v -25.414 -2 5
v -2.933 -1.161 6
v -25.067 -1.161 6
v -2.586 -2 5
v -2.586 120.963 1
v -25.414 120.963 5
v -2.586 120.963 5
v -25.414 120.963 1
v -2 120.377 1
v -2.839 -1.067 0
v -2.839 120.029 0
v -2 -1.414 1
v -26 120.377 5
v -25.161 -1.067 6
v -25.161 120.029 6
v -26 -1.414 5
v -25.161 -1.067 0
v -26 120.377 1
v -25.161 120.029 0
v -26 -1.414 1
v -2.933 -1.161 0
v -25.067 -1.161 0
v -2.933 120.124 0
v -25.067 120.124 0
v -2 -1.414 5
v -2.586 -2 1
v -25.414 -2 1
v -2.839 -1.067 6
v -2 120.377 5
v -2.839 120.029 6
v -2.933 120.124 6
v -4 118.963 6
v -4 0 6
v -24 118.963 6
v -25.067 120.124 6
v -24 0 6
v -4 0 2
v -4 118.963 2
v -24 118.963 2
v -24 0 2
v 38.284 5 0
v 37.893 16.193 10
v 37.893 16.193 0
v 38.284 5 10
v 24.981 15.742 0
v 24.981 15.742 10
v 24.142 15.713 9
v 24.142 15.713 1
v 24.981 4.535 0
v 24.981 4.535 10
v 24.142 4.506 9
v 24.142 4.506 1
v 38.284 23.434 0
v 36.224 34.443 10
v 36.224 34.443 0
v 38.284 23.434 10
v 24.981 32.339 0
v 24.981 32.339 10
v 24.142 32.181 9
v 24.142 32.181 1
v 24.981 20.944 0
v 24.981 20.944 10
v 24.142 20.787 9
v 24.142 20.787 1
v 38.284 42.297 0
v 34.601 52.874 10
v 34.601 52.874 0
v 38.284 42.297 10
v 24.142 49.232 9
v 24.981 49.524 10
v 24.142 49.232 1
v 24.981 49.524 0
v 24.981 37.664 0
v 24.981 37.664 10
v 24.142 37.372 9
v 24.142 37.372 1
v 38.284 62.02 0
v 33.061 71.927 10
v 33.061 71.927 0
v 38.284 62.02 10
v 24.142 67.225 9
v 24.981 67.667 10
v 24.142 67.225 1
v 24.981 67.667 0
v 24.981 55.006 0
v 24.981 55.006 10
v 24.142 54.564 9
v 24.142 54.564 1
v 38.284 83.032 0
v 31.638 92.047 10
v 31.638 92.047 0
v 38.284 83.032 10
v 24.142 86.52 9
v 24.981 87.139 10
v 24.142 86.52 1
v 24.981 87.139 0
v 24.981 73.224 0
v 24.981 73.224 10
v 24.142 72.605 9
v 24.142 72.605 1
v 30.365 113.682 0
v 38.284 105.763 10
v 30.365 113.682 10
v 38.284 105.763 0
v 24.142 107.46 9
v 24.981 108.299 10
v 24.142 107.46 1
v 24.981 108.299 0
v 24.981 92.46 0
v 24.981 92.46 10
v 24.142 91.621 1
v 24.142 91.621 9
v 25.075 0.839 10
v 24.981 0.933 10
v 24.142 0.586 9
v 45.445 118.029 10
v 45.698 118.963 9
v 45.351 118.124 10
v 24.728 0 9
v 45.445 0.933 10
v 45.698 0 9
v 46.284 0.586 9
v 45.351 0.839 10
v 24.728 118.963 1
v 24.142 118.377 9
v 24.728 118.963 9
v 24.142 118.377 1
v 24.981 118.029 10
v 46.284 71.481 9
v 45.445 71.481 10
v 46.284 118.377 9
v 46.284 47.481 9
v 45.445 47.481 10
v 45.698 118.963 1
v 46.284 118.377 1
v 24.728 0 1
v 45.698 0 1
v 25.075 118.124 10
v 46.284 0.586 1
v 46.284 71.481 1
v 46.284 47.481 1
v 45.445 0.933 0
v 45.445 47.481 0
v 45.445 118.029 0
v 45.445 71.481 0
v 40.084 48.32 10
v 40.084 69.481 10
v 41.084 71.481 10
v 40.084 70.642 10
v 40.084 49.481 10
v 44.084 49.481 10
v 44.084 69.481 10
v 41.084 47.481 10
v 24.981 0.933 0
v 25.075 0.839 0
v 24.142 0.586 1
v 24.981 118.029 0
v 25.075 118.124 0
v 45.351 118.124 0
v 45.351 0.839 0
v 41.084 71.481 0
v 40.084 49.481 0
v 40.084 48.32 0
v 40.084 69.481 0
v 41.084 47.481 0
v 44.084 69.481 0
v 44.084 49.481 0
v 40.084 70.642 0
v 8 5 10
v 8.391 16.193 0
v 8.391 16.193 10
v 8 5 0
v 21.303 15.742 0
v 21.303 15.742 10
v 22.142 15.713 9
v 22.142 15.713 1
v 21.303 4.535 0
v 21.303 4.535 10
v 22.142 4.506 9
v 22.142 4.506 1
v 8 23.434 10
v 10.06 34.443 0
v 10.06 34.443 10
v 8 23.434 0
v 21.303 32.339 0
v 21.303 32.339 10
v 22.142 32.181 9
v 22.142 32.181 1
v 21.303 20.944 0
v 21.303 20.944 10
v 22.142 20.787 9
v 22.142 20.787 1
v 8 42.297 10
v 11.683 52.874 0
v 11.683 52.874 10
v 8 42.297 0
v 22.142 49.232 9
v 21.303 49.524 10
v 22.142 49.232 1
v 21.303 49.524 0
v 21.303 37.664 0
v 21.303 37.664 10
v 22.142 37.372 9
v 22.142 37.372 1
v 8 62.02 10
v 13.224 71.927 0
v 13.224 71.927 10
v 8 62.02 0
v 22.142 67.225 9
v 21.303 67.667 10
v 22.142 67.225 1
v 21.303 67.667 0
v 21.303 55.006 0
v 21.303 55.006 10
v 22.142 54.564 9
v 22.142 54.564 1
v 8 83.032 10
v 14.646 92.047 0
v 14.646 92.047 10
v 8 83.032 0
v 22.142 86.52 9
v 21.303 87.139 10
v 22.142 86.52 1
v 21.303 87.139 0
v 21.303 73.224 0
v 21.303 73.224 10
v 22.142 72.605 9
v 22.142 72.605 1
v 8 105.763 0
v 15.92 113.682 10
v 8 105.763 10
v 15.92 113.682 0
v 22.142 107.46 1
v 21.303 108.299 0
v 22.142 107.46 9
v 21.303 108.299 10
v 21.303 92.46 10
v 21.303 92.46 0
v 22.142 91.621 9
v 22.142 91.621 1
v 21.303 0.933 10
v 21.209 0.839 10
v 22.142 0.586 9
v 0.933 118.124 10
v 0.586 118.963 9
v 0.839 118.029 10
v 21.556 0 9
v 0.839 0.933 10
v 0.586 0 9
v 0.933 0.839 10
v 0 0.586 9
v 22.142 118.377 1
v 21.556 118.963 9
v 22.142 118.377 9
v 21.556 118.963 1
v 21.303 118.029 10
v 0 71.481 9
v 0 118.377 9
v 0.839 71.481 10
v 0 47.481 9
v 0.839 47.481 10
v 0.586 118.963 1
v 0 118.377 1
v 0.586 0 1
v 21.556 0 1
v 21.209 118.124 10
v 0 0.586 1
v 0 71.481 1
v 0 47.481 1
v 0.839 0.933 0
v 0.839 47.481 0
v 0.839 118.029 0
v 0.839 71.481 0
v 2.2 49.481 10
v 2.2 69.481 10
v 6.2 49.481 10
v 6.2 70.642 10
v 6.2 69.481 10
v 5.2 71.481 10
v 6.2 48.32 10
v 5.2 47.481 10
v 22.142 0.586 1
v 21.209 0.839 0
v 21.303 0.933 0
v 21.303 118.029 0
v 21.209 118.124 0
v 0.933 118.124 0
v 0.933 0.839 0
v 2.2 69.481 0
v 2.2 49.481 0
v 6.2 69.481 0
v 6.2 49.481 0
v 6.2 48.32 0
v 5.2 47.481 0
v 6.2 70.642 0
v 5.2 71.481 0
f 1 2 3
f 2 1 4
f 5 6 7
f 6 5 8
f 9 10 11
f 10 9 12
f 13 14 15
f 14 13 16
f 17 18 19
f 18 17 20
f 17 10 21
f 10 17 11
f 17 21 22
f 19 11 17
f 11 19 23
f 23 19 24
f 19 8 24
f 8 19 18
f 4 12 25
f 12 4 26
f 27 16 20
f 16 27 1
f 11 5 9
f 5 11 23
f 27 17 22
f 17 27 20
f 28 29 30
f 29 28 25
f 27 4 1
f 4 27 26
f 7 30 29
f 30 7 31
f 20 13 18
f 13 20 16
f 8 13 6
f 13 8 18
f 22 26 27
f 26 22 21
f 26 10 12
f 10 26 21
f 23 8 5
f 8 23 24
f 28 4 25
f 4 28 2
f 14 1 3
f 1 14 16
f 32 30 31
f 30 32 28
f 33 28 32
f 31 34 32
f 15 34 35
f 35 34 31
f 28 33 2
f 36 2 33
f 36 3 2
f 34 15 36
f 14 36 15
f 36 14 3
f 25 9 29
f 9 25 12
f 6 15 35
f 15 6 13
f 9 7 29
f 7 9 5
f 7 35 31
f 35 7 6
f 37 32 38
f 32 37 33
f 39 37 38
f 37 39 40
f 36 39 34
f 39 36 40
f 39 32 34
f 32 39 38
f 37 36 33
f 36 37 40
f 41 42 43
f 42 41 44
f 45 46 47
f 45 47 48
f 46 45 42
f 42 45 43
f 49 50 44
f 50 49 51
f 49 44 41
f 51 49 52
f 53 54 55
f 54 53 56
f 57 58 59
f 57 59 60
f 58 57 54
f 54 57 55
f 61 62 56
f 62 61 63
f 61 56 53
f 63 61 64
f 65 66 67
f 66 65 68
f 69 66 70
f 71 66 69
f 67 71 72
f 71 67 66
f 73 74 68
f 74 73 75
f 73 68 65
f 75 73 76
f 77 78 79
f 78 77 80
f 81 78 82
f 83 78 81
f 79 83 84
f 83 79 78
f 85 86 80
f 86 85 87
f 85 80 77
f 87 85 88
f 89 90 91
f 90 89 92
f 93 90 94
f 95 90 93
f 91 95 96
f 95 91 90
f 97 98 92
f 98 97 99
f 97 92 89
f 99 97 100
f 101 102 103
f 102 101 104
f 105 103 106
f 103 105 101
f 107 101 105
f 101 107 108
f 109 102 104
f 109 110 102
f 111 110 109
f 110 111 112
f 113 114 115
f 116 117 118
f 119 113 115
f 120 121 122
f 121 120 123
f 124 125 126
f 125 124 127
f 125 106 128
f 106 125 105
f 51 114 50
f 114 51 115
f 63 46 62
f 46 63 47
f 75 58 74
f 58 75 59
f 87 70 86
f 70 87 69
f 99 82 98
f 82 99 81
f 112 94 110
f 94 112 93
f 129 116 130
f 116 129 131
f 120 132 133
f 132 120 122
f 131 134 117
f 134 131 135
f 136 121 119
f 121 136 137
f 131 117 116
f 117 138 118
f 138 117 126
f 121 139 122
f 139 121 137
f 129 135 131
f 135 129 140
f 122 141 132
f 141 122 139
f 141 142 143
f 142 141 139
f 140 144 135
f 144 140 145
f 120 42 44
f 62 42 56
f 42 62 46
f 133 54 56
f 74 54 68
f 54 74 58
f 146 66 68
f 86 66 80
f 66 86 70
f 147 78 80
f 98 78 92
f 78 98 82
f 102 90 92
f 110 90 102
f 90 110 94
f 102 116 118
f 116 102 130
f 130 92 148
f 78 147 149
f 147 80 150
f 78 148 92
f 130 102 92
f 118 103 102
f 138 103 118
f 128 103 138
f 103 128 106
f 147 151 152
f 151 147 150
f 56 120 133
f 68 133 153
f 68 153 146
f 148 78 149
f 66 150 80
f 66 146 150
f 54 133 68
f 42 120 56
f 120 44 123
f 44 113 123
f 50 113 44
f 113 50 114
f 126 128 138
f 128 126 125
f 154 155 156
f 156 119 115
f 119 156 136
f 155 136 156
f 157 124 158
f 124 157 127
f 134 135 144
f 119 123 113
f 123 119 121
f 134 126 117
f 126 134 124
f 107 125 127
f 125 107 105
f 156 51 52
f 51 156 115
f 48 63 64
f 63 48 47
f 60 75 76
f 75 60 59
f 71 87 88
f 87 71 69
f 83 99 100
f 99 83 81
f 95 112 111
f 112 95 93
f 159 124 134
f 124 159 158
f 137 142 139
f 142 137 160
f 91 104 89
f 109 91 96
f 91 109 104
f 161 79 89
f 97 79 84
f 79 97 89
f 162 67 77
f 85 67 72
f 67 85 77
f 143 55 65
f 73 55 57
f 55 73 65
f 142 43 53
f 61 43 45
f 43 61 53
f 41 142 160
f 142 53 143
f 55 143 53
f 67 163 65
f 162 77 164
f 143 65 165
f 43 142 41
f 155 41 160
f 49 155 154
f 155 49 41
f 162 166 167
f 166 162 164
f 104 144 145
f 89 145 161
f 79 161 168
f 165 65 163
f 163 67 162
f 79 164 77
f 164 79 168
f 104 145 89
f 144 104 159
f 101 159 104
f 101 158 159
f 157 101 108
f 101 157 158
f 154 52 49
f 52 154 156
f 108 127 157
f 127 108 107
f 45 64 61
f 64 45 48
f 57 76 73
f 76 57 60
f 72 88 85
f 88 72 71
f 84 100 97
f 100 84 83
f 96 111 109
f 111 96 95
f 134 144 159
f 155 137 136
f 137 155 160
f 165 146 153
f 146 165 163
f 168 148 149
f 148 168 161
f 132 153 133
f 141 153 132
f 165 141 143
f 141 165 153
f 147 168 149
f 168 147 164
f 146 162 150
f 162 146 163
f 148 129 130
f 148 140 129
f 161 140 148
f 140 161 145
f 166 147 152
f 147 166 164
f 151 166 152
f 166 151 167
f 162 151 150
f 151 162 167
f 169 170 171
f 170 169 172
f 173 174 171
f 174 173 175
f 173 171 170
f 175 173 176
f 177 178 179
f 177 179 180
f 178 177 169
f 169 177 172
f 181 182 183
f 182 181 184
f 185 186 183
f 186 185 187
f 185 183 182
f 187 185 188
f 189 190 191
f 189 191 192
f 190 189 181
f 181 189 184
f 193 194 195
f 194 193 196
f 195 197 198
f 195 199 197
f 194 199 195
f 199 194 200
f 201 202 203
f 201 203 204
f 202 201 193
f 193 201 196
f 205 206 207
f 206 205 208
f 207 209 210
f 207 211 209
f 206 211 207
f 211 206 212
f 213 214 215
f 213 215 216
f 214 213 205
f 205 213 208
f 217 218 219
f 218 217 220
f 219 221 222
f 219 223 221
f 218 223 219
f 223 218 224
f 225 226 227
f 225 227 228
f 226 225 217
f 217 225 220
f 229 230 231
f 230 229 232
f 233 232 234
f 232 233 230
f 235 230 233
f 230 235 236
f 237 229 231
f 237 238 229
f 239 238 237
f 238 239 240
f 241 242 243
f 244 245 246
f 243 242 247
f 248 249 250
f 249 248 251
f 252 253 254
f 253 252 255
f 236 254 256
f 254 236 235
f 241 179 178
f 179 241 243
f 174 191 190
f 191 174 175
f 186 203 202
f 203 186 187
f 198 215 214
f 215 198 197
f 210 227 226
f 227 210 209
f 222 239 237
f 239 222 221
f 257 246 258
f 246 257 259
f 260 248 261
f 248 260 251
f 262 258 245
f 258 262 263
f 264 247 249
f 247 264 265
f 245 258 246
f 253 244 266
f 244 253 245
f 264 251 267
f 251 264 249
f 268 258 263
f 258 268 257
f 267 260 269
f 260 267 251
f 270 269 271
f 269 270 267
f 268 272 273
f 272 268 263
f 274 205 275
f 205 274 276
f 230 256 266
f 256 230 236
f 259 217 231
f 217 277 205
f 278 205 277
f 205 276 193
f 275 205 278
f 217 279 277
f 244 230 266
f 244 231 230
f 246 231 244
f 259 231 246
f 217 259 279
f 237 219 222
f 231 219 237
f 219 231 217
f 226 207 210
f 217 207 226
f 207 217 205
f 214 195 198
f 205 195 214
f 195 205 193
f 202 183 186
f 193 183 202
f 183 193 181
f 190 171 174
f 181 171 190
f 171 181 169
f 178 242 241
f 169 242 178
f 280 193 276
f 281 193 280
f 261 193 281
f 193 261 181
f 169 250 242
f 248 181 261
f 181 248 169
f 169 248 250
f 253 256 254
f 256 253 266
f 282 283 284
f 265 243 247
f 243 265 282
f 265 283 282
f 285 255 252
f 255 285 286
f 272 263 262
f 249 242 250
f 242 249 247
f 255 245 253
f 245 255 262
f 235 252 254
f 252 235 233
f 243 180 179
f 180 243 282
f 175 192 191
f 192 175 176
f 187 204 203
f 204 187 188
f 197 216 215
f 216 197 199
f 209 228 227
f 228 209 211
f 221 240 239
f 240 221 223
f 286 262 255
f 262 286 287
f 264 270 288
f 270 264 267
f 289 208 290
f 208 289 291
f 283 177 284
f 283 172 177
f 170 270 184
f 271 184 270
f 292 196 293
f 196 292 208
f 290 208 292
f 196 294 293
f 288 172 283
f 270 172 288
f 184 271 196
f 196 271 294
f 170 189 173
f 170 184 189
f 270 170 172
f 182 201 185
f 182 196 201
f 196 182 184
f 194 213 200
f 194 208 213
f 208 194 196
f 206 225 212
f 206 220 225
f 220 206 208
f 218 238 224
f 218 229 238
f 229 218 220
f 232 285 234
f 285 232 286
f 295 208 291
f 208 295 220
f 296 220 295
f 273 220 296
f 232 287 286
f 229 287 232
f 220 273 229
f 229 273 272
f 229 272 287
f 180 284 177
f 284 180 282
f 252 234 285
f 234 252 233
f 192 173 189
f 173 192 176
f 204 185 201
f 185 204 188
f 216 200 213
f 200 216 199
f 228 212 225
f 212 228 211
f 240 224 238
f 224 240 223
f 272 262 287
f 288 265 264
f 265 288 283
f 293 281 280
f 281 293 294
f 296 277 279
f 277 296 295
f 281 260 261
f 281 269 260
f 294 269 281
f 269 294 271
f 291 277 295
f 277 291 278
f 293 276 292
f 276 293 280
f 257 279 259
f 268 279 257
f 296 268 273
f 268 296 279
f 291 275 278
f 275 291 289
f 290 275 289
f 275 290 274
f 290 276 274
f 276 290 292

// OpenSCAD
// Title: MultiStand
// Author: http://www.thingiverse.com/Jinja
// Date: 29/1/2013

/////////// START OF PARAMETERS /////////////////

// The thickness of your tablet. This will determine the size of the slots your tablet will fit into. mm =
tablet_thickness = 11.2;

// The height of your tablet. If you only want landscape, then use the short length. Otherwise use the long length. mm =
tablet_height = 190;

// How deep each slot will be, just under 10% of your tablet height is a good guide. mm =
slot_depth = 10.0;

// Increase the length of your stand to get more slots, % =
extra_length_percent=0; //[0:100]

// How many lids do you want for your stand. 
number_of_lids = 1; // [1:OneLid, 2:TwoLids]

// How wide in mm each rest will be. mm =
stand_width = 10; //[6:20]

// To discover the calibration value of your printer, first print out the lid. Then print out the calibration rest which will fit onto the lid. If the fit is too loose then increase the calibration and try again. If the fit is too tight then decrease the calibration value. I suggest printing out CalibrationRests for values 0, 2 & 4 simultaneously and go from there. When you've found your value then you can print out the full sized Rest. Zero means your printer is perfectly calibrated. Value = 
calibration = 0;//[-8:8]

// Select which STL plate you want to create. 
plate = "FullPlate"; //[ Lid, CalibrationRest, Rest, FullPlate ]

// Choose the pattern for the lid. For speed, use the circle to iterate on positioning before choosing the pattern you want. This is because the circle is faster to process. In fact, the list is ordered from fast to slow.
patternID = 0; // [0:NoPattern, 1:Circle, 4:Fish, 3:Apple, 5:Makerbot, 2:Android]

// Offset the pattern in the X axis. mm =
pattern_offset_x = 0; //[-20:20]

// Offset the pattern in the Y axis. mm =
pattern_offset_y = 0; //[-20:20]

// The size of the pattern. mm =
pattern_size = 35; //[8:60]

// Spacing percentage. 100=no overlap. Less than 100 means some overlap. More than 100 means more space between the patterns. % =
pattern_overlap_percent = 105; //[50:150]

// preview[view:south, tilt:top]

/////////// END OF PARAMETERS /////////////////
// not parameters, do not change
pattern_overlap = pattern_overlap_percent/100;
overhang = 40*1;  // the angle of overhang your printer can manage (no need to exceed 45)
rounded = 1*1;    // the mm width of the bevelled edge
rear_buf = 5*1;
front_buf = 2+tablet_thickness;

holder_height = 6*1;
holder_thick = 2*1;

extra_length=1+ (extra_length_percent/100);
base_min = holder_height+2;
height = base_min+slot_depth/sin(45);
slot_range = tablet_height*sin(45)*0.75*extra_length;
depth = rear_buf+slot_range + front_buf;
spacing = (1.1*tablet_thickness)/sin(45);
num_slots = floor(slot_range/spacing);
buffer = (calibration)*0.05;

calib_width = 2*(stand_width+holder_thick)+4;

if( plate == "Calibration" )
{
	test_stand();
	translate([-7,12,0])
	holder(3, 20, 0, 0);
}
else if( plate == "CalibrationRest" )
{
//		translate([0,-depth*0.5+5+holder_thick+2,0])
//		final_stand(number_of_lids);
	difference()
	{
	intersection()
	{
		translate([0,-depth*0.5+stand_width+holder_thick+2,0])
		final_stand(1);
		cube([holder_height+2,calib_width,5]);
	}

	for(i=[-8:1:8])
	{
		translate([holder_height+2,(0.5+(i/16))*calib_width,5*0.5])
		cube([calib_width/32,calib_width/32,calib_width/32],true);
	}
	for(i=[-8:8:8])
	{
		translate([holder_height+2,(0.5+(i/16))*calib_width,5*0.3])
		cube([calib_width/32,calib_width/32,calib_width/32],true);
	}
	translate([holder_height+2,(0.5+(calibration/16))*calib_width,5*0.7])
	cube([calib_width/32,calib_width/32,calib_width/32],true);
	}
}
else if( number_of_lids == 1 )
{
   if( plate == "FullPlate" )
	{
		translate([-(stand_width+holder_thick)-2,depth*0.5,0])
		holder(stand_width, depth, 0, patternID);
	
		translate([2*height+2,0,0])
		scale([-1,1,1])
		final_stand(number_of_lids);
	
		translate([0,0,0])
		final_stand(number_of_lids);
	}
	else if ( plate == "Lid" )
	{
		translate([-(stand_width+holder_thick)-2,depth*0.5,0])
		holder(stand_width, depth, 0, patternID);
	}
	else if ( plate == "Rest" )
	{
		final_stand(number_of_lids);
	}
}
else if ( number_of_lids == 2 )
{
   if( plate == "FullPlate" )
	{
		translate([3*-(stand_width+holder_thick)-4,depth*0.5,0])
		holder(stand_width, depth, 0, patternID);
	
		translate([-(stand_width+holder_thick)-2,depth*0.5,0])
		holder(stand_width, depth, 0, patternID);
	
		translate([2*height+2,0,0])
		scale([-1,1,1])
		final_stand(number_of_lids);
	
		translate([0,0,0])
		final_stand(number_of_lids);
	}
	else if ( plate == "Lid" )
	{
		translate([-(stand_width+holder_thick)-2,depth*0.5,0])
		holder(stand_width, depth, 0, patternID);
	}
	else if ( plate == "Rest" )
	{
		final_stand(number_of_lids);
	}

}


$fs=0.3;
//$fa=5; //smooth
$fa=10; //not so smooth
//$fa=20; //rough

module lid_cutter(pos, patternID )
{
	translate([0.2,depth*0.5,0])
	rotate([90,0,90])
	holder(stand_width, depth, buffer, patternID);

	translate([-1,depth*0.5,0])
	rotate([90,0,90])
	holder(stand_width, depth, buffer, patternID);
}

module test_stand()
{
	step = 13;
	difference()
	{
		minkowski()
		{
			translate([rounded, rounded, rounded])
			cube([11, 8*step+2, 1]);
			diamond(rounded);
		}
	for(i=[0:1:7])
	{
		translate([0,i*step+8,0])
		rotate( [90,0,90] )
   	holder( 3, 20, 0.0+(i*0.05) );
		translate([-1,i*step+8,0])
		rotate( [90,0,90] )
   	holder( 3, 20, 0.0+(i*0.05) );
		
		translate([7,i*step+4,1])
		{
			if(i==0)
			{
				write("1",h=8,t=4);
			}
			else if(i==1)
			{
				write("2",h=8,t=4);
			}
			else if(i==2)
			{
				write("3",h=8,t=4);
			}
			else if(i==3)
			{
				write("4",h=8,t=4);
			}
			else if(i==4)
			{
				write("5",h=8,t=4);
			}
			else if(i==5)
			{
				write("6",h=8,t=4);
			}
			else if(i==6)
			{
				write("7",h=8,t=4);
			}
			else if(i==7)
			{
				write("8",h=8,t=4);
			}
		}

	}
	}
}

module final_stand(number_of_lids)
{
	pos = -stand_width*2;
	if( number_of_lids == 1 )
	{
		difference()
		{
			stand2();
			lid_cutter(pos,0);
		}
	}
	else if (number_of_lids == 2 )
	{
		difference()
		{
			stand2();
			translate([0,depth*0.25,0])	
			lid_cutter(pos,0);
			translate([0,depth*-0.25,0])	
			lid_cutter(pos,0);
		}
	}
}

module right_stand(number_of_lids)
{
//	pos = -stand_width;
	pos = -stand_width*2;
	if( number_of_lids == 1 )
	{
		difference()
		{
			stand();
			lid_cutter(pos,0);
		}
	}
	else if (number_of_lids == 2 )
	{
		difference()
		{
			stand();
			translate([0,depth*0.25,0])	
			lid_cutter(pos,0);
			translate([0,depth*-0.25,0])	
			lid_cutter(pos,0);
		}
	}

}

module left_stand(number_of_lids)
{
//	pos = -depth-2*holder_thick;
	pos = -stand_width*2;
	if( number_of_lids == 1 )
	{
		difference()
		{
			stand();
			lid_cutter(pos,0);
		}
	}
	else if (number_of_lids == 2 )
	{
		difference()
		{
			stand();

			translate([0,depth*0.25,0])	
			lid_cutter(pos,0);
			translate([0,depth*-0.25,0])	
			lid_cutter(pos,0);
		}
	}
}

module holder(stand_width, depth, outerextra, patternID)
{
	difference()
	{
		minkowski()
		{
			translate([0, 0, (holder_height+outerextra)*0.5])
			cube([(stand_width+holder_thick+outerextra)*2-(2*rounded), depth+2*(outerextra+holder_thick)-(2*rounded), holder_height+outerextra-(2*rounded)],true);
			diamond(rounded);
		}
		translate([0, 0, holder_thick+holder_height*0.5 + outerextra])
		cube([(stand_width-outerextra)*2, depth-2*outerextra, holder_height+outerextra],true);

		if( patternID > 0 )
		{
			pattern(stand_width, depth, outerextra, patternID );
		}
	}
}

module pattern(stand_width, depth, extra, patternID)
{
	xoffset = pattern_offset_x;
	yoffset = pattern_offset_y;
	steps = pattern_size;
	radius = steps*0.45;
	overlap = pattern_overlap;
	intersection()
	{
		for(x=[xoffset-10:steps*overlap:(stand_width+holder_thick+extra)*2-(2*rounded)+(steps)+xoffset+10])
		{
			for(y=[yoffset-10:steps*overlap:depth+2*(extra+holder_thick)-(2*rounded)+(steps)+yoffset+10])
			{
				translate([-stand_width*2, -0.5*(depth+2*(extra+holder_thick)-(2*rounded)), 0])
				translate([x,y,-1])
				rotate([0,0,x*57+y*79])
				pattern_shape( radius, 10, patternID );
//				android( radius*2, 10 );
//				cylinder(10, radius, radius);
			}
		}
		translate([0, 0, (holder_height+extra)*0.5])
		cube([(stand_width+extra)*2, depth+2*extra, holder_height*3],true);
	}
}

module stand2()
{
	final_spacing = slot_range/(num_slots);
	between = (final_spacing - tablet_thickness);
	adj_spacing = final_spacing - (between/num_slots);
	difference()
	{
		minkowski()
		{
			translate([rounded-buffer, rounded-buffer, rounded])
			cube([height-(2*rounded), depth-(2*rounded)-(2*buffer)-(2*buffer), stand_width-(2*rounded)-(2*buffer)]);
			diamond(rounded);
		}
		if( num_slots > 7 )
		{

			for(i=[0:1:(num_slots)])
			{
				
				translate([base_min,(i*adj_spacing)+rear_buf+(((i/num_slots)*(i/num_slots)*(i/num_slots)*(i/num_slots)*(i/num_slots)*(i/num_slots))*between),-0.1])
				rotate([0,0,-(0+i*(45/(num_slots)))])
				cube([height*2, tablet_thickness, stand_width-2*buffer+0.2]);
			}
		}
		else if( num_slots > 5 )
		{
			for(i=[0:1:(num_slots)])
			{
				
				translate([base_min,(i*adj_spacing)+rear_buf+(((i/num_slots)*(i/num_slots)*(i/num_slots)*(i/num_slots)*(i/num_slots))*between),-0.1])
				rotate([0,0,-(0+i*(45/(num_slots)))])
				cube([height*2, tablet_thickness, stand_width-2*buffer+0.2]);
			}
		}
		else
		{
			for(i=[0:1:(num_slots)])
			{
				
				translate([base_min,(i*adj_spacing)+rear_buf+(((i/num_slots)*(i/num_slots)*(i/num_slots))*between),-0.1])
				rotate([0,0,-(2+i*(43/(num_slots)))])
				cube([height*2, tablet_thickness, stand_width-2*buffer+0.2]);
			}
		}
	}
}

module cutter(dist, overhang)
{
	size = dist*2;

	translate([dist,-dist,-dist])
	cube([size,size,size]);

	translate([-dist-size,-dist,-dist])
	cube([size,size,size]);

	translate([dist,-dist,0])
	rotate([0,-overhang,0])
	cube([size,size,size]);

	translate([-dist,-dist,0])
	rotate([0,-90+overhang,0])
	cube([size,size,size]);

	translate([dist,-dist,0])
	rotate([0,90+overhang,0])
	cube([size,size,size]);

	translate([-dist,-dist,0])
	rotate([0,180-overhang,0])
	cube([size,size,size]);

}

module diamond( rounded )
{
	dist = rounded;
	difference()
	{
		cube([2*rounded,2*rounded,2*rounded], true);
		for(i=[0:45:179])
		{
			rotate([0,0,i])
			cutter(dist, overhang);
		}
	}
}

//translate([0,0,30])
//android( 20, 4 );

module android( oheight, depth )
{
	scale = 1.1;
	height = oheight*scale;
	width = height*0.4;
	gap = height*0.03;
	radius = height*0.045;

//	cube( [ oheight,2,oheight] );

	translate( [-oheight*0.5,oheight*0.5,0])
	rotate([90,0,0])
	translate( [-(height-oheight)*0.5,-depth-1,-height*0.14])
	{
	translate( [(height-width)*0.5+radius,depth,(height-width)*0.5+radius])

/*	minkowski()
	{
		translate([0,0,0])
		cube( [ width-(2*radius),depth-1,width-(2*radius)] );
		rotate([-90,0,0])
		cylinder( 1, radius, radius );
	}*/

	hull()
	{
		translate([0,0,0])
		rotate([-90,0,0])
		cylinder( depth, radius, radius );

		translate([width-(2*radius),0,0])
		rotate([-90,0,0])
		cylinder( depth, radius, radius );

/*		translate([width-(2*radius),0,width-(2*radius)])
		rotate([-90,0,0])
		cylinder( depth, radius, radius );

		translate([0,0,width-(2*radius)])
		rotate([-90,0,0])
		cylinder( depth, radius, radius );*/

		translate( [-((height-width)*0.5+radius),-depth,-((height-width)*0.5+radius)])
		translate( [(height-width)*0.5,depth,(height)*0.5])
		cube( [ width,depth,width*0.5] );

	}


	translate( [height*0.5,depth,(height+width)*0.5+gap])

	rotate([-90,0,0])
	difference()
	{
		cylinder( depth, width*0.5, width*0.5 );
		translate([-width*0.5,0,0])
		cube( [width,width,depth]);
		if(radius*0.25>0.7)
		{
			translate([-radius*2,-radius*2,0])
			cylinder( depth, radius*0.5, radius*0.5 );
			translate([radius*2,-radius*2,0])
			cylinder( depth, radius*0.5, radius*0.5 );

			// the next two cubes are the things that keep the eyes in place
			translate([-radius*2,-radius*2,0])
			rotate([0,0,-135])
			translate([0,radius*-0.125,0])
			cube([radius*2,radius*0.25,depth]);
		
			translate([radius*2,-radius*2,0])
			rotate([0,0,-45])
			translate([0,radius*-0.125,0])
			cube([radius*2,radius*0.25,depth]);
		}
	}
			

	translate( [((height-width)*0.5)-radius-gap,depth,((height+width)*0.5)-radius])
	arm(radius,depth);
	translate( [((height+width)*0.5)+radius+gap,depth,((height+width)*0.5)-radius])
	arm(radius,depth);

	translate( [(height*0.5)+(1.8*radius),depth,(height*0.4)])
	arm(radius,depth);
	translate( [(height*0.5)-(1.8*radius),depth,(height*0.4)])
	arm(radius,depth);

	translate([height*0.5+width*0.35,depth,height*0.95])
	rotate([0,40,0])
	arm(radius*0.3,depth);

	translate([height*0.5-width*0.35,depth,height*0.95])
	rotate([0,-40,0])
	arm(radius*0.3,depth);
	}
}

module arm(radius,depth)
{
	hull()
	{
		rotate([-90,0,0])
		cylinder(depth,radius,radius);
		translate([0,0,-4.7*radius])
		rotate([-90,0,0])
		cylinder(depth,radius,radius);
	}
}


/*translate([0,0,20])
pattern_shape(10, 5, 1);

translate([0,0,30])
pattern_shape(10, 5, 2);

translate([0,0,40])
pattern_shape(10, 5, 3);

translate([0,0,50])
pattern_shape(10, 5, 4);

translate([0,0,60])
pattern_shape(10, 5, 5);
*/

module pattern_shape( radius, height, patternID )
{
	if( patternID == 1 )
	{
		cylinder(height, radius, radius);
	}
	else if (patternID == 2)
	{
		android(radius*2, height);
	}
	else if (patternID == 3)
	{
		apple( radius, height );
	}
	else if (patternID == 4)
	{
		fish( radius, height );
	}
	else if (patternID == 5)
	{
		makerbot_logo( radius, height );
	}
}

module apple(radius, depth)
{
	fish_scale = 0.22 * (radius/5);
	fish_height = depth/fish_scale;

	difference()
	{
		translate( [-radius*0.9,0,depth*0.5] )
		scale(fish_scale)
		translate( [20,0,0] )
		linear_extrude(height = fish_height, center = true)
		polygon([[0,-15],[-4,-16],[-7,-16],[-10,-14],[-12,-11],[-15,-5],[-17,3],[-17,7],[-16,11],[-15,13],[-13,15],[-9,16],[-5,16],[-3,15],[0,14],[3,15],[5,16],[9,16],[13,15],[15,13],[16,11],[17,7],[17,3],[15,-5],[12,-11],[10,-14],[7,-16],[4,-16]]);

		translate( [radius*0.8,radius*0.2,0] )
		cylinder(depth, radius*0.4, radius*0.4);
	}

	translate( [-radius*0.9,0,depth*0.5] )
	scale(fish_scale)
	translate( [20,0,0] )
	linear_extrude(height = fish_height, center = true)
	polygon([[0,20],[0,17],[3,17],[6,18],[7,19],[8,20],[9,23],[9,26],[9,26],[6,26],[3,25],[2,24],[1,23]]);


}

module fish(radius, depth)
{
	fish_scale = 0.22 * (radius/5);
	fish_height = depth/fish_scale;
	translate( [-radius*0.9,0,depth*0.5] )
	scale(fish_scale)
	translate( [43,-12,0] )
	linear_extrude(height = fish_height, center = true)
	polygon([[-45,12],[-41,16],[-38,18],[-34,20],[-30,21],[-25,21],[-21,20],[-19,19],[-16,17],[-14,14],[-13,15],[-12,18],[-9,21],[-4,22],[-6,19],[-8,17],[-9,13],[-9,11],[-8,7],[-6,5],[-4,2],[-9,3],[-12,6],[-13,9],[-14,10],[-16,7],[-19,5],[-21,4],[-25,3],[-30,3],[-34,4],[-38,6],[-41,8]]);
}

module makerbot_logo(radius, height)
{
	width=radius*0.13;
	cut=width*1.3;
	angle=asin(cut/radius);
	aangle=0;
	x1=(radius-width*0.5)*sin(angle+aangle);
	y1=(radius-width*0.5)*cos(angle+aangle);
	x2=(radius-width*0.5)*sin(-angle+aangle);
	y2=(radius-width*0.5)*cos(-angle+aangle);
	mwidth=width*1.8;
	mgap=width*1.3;
	mheight = radius*1.3;

	difference()
	{
		cylinder(height, radius, radius);
		cylinder(height, radius-width, radius-width);
		translate([0,0,height*0.5])
		rotate([0,0,-aangle])
		{
			cube([2*radius,cut+width,height],true);
			cube([cut+width,2*radius,height],true);
		}
	}

	translate([x1,y1,0])
	cylinder(height, width*0.5, width*0.5);
	translate([y1,-x1,0])
	cylinder(height, width*0.5, width*0.5);
	translate([-y1,x1,0])
	cylinder(height, width*0.5, width*0.5);
	translate([-x1,-y1,0])
	cylinder(height, width*0.5, width*0.5);
	translate([x2,y2,0])
	cylinder(height, width*0.5, width*0.5);
	translate([y2,-x2,0])
	cylinder(height, width*0.5, width*0.5);
	translate([-y2,x2,0])
	cylinder(height, width*0.5, width*0.5);
	translate([-x2,-y2,0])
	cylinder(height, width*0.5, width*0.5);


	translate([0,mwidth*-0.25,height*0.5])	
	cube([mwidth,mheight-1.5*mwidth,height],true);
	translate([mwidth+mgap,mwidth*-0.25,height*0.5])
	cube([mwidth,mheight-1.5*mwidth,height],true);
	translate([-mwidth-mgap,mwidth*-0.25,height*0.5])
	cube([mwidth,mheight-1.5*mwidth,height],true);
	translate([0,(mheight-mwidth)*0.5,height*0.5])	
	cube([mwidth+2*mgap,mwidth,height],true);

	translate([-mgap-mwidth*0.5,mheight*0.5-mwidth,0])
	difference()
	{
		cylinder(height,mwidth,mwidth);
		translate([0,-mwidth,0])
		cube([mwidth,mwidth,height]);
	}

	translate([mgap+mwidth*0.5,mheight*0.5-mwidth,0])
	difference()
	{
		cylinder(height,mwidth,mwidth);
		translate([-mwidth,-mwidth,0])
		cube([mwidth,mwidth,height]);
	}

	translate([-mwidth-mgap,-(mheight-mwidth)*0.5,0])
	cylinder(height,mwidth*0.5,mwidth*0.5);

	translate([0,-(mheight-mwidth)*0.5,0])
	cylinder(height,mwidth*0.5,mwidth*0.5);

	translate([mwidth+mgap,-(mheight-mwidth)*0.5,0])
	cylinder(height,mwidth*0.5,mwidth*0.5);

}
